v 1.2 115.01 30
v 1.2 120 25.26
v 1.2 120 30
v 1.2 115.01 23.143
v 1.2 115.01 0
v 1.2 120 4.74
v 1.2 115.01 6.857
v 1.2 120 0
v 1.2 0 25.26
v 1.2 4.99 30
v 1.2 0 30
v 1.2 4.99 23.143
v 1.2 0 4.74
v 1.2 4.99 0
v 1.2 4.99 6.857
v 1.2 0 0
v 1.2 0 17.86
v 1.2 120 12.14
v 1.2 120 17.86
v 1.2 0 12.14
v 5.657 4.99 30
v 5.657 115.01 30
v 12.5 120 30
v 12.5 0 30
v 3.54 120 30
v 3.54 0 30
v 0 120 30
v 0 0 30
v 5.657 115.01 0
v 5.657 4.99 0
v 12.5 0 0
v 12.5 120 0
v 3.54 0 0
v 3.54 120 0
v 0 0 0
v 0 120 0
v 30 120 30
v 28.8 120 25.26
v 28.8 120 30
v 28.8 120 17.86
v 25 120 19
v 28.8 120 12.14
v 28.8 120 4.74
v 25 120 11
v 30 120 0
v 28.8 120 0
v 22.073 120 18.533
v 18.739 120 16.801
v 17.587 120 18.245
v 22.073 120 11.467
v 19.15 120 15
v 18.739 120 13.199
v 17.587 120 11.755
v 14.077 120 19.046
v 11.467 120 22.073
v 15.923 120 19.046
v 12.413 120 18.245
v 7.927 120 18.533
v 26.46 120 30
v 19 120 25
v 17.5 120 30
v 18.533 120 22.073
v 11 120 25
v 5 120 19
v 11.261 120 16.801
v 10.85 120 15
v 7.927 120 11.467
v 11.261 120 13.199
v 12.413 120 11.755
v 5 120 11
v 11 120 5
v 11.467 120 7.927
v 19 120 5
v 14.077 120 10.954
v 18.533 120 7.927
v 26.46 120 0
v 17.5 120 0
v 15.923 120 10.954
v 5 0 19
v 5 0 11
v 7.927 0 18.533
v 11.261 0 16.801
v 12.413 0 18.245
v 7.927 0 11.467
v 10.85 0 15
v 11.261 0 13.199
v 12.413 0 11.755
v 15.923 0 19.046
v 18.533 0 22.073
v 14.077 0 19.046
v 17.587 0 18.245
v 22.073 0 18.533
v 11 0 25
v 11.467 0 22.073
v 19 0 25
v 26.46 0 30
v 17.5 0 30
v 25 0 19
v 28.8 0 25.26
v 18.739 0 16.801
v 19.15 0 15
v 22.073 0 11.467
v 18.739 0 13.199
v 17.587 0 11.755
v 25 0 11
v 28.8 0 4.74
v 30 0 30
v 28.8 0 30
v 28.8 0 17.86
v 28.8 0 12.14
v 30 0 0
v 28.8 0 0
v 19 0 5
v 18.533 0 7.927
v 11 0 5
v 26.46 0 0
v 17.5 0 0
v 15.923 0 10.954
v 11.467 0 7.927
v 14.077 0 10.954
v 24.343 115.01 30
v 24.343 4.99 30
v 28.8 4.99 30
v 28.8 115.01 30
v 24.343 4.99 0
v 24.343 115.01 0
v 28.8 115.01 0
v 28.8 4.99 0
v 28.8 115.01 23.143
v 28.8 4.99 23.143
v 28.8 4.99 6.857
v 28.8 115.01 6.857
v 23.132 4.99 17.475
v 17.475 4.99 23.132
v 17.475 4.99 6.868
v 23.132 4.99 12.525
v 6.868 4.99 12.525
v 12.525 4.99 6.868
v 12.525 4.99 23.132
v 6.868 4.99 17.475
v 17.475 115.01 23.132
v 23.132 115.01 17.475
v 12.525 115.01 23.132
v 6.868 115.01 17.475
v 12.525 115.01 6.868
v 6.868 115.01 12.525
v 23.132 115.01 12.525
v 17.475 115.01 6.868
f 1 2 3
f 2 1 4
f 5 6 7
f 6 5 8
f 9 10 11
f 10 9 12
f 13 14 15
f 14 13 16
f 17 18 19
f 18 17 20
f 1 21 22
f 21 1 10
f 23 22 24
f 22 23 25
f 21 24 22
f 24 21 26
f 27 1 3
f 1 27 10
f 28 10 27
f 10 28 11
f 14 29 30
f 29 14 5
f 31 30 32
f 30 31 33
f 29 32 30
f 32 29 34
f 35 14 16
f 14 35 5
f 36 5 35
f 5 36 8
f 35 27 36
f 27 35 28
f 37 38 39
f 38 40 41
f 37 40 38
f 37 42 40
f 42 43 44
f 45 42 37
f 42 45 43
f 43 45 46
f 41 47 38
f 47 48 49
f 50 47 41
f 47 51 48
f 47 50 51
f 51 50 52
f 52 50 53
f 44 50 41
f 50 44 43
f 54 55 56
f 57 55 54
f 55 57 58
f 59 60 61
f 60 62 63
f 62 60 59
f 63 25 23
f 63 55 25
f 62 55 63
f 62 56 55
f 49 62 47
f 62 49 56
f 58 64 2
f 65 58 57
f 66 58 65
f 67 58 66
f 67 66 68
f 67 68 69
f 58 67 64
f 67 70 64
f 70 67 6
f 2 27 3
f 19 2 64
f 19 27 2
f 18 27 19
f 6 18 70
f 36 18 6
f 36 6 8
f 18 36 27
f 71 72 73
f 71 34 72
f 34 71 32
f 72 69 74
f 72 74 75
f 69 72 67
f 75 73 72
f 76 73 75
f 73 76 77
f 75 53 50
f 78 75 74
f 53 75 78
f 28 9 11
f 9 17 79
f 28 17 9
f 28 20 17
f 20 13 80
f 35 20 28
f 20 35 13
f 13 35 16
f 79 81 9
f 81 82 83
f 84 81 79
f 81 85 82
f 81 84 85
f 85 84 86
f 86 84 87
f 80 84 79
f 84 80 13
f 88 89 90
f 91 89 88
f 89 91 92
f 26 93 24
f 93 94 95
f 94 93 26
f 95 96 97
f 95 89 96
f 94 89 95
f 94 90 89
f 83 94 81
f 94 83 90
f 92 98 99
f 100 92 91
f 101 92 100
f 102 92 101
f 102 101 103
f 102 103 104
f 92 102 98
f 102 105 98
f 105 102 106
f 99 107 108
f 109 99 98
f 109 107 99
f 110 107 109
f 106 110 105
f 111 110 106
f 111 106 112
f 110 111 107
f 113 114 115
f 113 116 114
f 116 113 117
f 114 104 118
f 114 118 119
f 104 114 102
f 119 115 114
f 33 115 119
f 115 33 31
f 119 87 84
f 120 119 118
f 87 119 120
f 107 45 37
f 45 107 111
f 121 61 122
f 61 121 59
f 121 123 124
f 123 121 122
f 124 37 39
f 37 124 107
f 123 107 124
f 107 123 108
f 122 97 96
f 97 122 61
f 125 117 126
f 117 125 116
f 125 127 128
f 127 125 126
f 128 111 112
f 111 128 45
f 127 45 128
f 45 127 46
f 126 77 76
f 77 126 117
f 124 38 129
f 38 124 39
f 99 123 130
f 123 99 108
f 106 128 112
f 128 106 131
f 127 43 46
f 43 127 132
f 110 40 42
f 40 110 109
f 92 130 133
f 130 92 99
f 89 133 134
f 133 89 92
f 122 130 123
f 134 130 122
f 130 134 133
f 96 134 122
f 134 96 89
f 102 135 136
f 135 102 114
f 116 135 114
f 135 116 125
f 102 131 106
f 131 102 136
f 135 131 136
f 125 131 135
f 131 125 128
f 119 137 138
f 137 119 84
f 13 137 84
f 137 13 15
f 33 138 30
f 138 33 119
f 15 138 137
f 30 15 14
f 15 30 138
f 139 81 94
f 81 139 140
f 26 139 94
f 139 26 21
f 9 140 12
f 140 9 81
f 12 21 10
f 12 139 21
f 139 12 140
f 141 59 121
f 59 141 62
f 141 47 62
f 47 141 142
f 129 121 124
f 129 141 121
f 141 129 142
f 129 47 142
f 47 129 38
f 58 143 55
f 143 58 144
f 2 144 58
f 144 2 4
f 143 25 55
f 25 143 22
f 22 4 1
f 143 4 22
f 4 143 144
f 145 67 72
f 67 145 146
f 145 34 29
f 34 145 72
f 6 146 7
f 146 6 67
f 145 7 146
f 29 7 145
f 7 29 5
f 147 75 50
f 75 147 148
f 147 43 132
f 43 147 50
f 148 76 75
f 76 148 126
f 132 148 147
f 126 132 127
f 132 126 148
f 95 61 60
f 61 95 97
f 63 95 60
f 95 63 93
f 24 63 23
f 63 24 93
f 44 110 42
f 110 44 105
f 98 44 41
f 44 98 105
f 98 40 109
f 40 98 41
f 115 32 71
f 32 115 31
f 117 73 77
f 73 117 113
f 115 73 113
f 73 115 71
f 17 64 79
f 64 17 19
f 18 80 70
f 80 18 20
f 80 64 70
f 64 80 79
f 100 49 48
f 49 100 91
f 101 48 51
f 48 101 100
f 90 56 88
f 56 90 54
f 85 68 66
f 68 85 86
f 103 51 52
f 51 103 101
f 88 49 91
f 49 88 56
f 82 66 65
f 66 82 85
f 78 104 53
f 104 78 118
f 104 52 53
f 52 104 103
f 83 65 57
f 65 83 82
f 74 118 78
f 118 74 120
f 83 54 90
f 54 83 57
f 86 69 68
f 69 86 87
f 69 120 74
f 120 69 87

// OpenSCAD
// file: globals.scad
/*
Most things in this file is represented as one millimeter, so keep that in mind while changing things.
Some of the setting are not mm but at variables that you can set, such as 2*x=2x and you are setting what x is.
I will try to specify when things are variables and not exact measurements.
*/

// printer slop
slop = 0.15;

obj_leg = 30;
leg_length = 5.5;
small_number = 0.001;
metal_core_rode_global = 5;


///////////////// number of holes /////////////////////
z_hole_number = 8;
other_holes = 8;

///////////////// Pins /////////////////////

//pins that poke out
ball_size = 10;
pin_height = 20;
pin_diameter = 6;


//holes
hole_ball_size = ball_size;
hole_pin_height = pin_height;
hole_pin_diameter = pin_diameter;

///////////////// Z THINGS /////////////////////

berring_slot_width = 7.5;
berring_slot_depth = 6.5;
metal_core_rode = 5;

///////////////// X THINGS /////////////////////

//male dove tails
male_dove_max_width=8;
male_dove_min_width=5;
male_dove_depth=5;
male_dove_height=obj_leg/2;

function scaled_male_dove_max_width() = male_dove_max_width;
function scaled_male_dove_min_width() = male_dove_min_width - 0.5*slop;
function scaled_male_dove_depth() = male_dove_depth - .2;

//female dove tails, this is found on the y mounts
girl_max_width=11;
girl_min_width=5;
girl_depth=5;
girl_height=obj_leg;


///////////////// Y THINGS /////////////////////
/*
The Y is so normal that all of those global variables at the top should change all of the setting in it, this section is set her incase there are variables set in the future development of this project.
*/

// stepper
motor_side_length = 42.3;
motor_height = 40;
motor_bolt_hole_distance = 31;
motor_center_hole = 23;
motor_shaft_dia = 5;
motor_shaft_hole_dia = 5;

// bolts etc.
bolt_hole_dia = 3 + 2*slop;
bolt_head_hole_dia = 6.2;

m4_bolt_hole_dia = 4 + 2*slop;
m4_bolt_head_hole_dia = 6.8 + 2*slop;

m3_nut_side = 5.65;
m3_nut_height = 2.3;
m4_nut_side = 6.85;
m4_nut_height = 3.1;

// threaded rod
lifter_rod_diam = 9.86;
hole_threaded_rod = lifter_rod_diam + 2*slop;

// for the extensions
// metal_rod_size = 9;
metal_rod_size = 8.3; // metric

// z screw
z_screw_d = 25;

// stabilizer
pin_bolt_dia = 12 - 2*slop;
pin_bolt_dia_minus = 12 + 2*slop;

clip_bolt_dia = 10 - 2*slop;
clip_bolt_dia_minus = 10 + 2*slop;

// rack
rack_teeth_angle = 30;
rack_h = 12;
rack_tooth = 5;
// main file
include <include.scad>;
include <globals.scad>;

support = true;
//min number of units is 2
//max is however large your printer can print
units = 4;

tip_size = 1.2;


module extention(){
	
	module added(){
            cube([30, 30*units, 30]);
	}

	module subtracted(){
	    translate([15,0,15]) rotate([0,45,0]) tie_end();
	translate([15,units*30,15]) rotate([0,45,0]) rotate([0,0,180]) tie_end();
	translate([15,15,15]) rotate([90,0,0]) cylinder(h=5000, d= metal_rod_size, center=true);

	for (y = [-1:units-2]) // two iterations, z = -1, z = 1
	{
			translate([15, (y*30)+15, 15]){
			for (r = [0:4]) // two iterations, z = -1, z = 1
			{
				rotate([0,r*90,0]) translate([0,15,15]) rotate([-90,0,0])male_dovetail(height=30);
			}
		}
	}

	} //subtracted
	difference(){
		added();
		subtracted();
	}	
} //module extention

//support
if (support==true)
{
	cube([tip_size,30*4,30]);
	translate([30-tip_size,0,0]) cube([tip_size,30*4,30]);
}

module extention_finished(){
		rotate([0,0,0]) extention();
}

extention_finished();
